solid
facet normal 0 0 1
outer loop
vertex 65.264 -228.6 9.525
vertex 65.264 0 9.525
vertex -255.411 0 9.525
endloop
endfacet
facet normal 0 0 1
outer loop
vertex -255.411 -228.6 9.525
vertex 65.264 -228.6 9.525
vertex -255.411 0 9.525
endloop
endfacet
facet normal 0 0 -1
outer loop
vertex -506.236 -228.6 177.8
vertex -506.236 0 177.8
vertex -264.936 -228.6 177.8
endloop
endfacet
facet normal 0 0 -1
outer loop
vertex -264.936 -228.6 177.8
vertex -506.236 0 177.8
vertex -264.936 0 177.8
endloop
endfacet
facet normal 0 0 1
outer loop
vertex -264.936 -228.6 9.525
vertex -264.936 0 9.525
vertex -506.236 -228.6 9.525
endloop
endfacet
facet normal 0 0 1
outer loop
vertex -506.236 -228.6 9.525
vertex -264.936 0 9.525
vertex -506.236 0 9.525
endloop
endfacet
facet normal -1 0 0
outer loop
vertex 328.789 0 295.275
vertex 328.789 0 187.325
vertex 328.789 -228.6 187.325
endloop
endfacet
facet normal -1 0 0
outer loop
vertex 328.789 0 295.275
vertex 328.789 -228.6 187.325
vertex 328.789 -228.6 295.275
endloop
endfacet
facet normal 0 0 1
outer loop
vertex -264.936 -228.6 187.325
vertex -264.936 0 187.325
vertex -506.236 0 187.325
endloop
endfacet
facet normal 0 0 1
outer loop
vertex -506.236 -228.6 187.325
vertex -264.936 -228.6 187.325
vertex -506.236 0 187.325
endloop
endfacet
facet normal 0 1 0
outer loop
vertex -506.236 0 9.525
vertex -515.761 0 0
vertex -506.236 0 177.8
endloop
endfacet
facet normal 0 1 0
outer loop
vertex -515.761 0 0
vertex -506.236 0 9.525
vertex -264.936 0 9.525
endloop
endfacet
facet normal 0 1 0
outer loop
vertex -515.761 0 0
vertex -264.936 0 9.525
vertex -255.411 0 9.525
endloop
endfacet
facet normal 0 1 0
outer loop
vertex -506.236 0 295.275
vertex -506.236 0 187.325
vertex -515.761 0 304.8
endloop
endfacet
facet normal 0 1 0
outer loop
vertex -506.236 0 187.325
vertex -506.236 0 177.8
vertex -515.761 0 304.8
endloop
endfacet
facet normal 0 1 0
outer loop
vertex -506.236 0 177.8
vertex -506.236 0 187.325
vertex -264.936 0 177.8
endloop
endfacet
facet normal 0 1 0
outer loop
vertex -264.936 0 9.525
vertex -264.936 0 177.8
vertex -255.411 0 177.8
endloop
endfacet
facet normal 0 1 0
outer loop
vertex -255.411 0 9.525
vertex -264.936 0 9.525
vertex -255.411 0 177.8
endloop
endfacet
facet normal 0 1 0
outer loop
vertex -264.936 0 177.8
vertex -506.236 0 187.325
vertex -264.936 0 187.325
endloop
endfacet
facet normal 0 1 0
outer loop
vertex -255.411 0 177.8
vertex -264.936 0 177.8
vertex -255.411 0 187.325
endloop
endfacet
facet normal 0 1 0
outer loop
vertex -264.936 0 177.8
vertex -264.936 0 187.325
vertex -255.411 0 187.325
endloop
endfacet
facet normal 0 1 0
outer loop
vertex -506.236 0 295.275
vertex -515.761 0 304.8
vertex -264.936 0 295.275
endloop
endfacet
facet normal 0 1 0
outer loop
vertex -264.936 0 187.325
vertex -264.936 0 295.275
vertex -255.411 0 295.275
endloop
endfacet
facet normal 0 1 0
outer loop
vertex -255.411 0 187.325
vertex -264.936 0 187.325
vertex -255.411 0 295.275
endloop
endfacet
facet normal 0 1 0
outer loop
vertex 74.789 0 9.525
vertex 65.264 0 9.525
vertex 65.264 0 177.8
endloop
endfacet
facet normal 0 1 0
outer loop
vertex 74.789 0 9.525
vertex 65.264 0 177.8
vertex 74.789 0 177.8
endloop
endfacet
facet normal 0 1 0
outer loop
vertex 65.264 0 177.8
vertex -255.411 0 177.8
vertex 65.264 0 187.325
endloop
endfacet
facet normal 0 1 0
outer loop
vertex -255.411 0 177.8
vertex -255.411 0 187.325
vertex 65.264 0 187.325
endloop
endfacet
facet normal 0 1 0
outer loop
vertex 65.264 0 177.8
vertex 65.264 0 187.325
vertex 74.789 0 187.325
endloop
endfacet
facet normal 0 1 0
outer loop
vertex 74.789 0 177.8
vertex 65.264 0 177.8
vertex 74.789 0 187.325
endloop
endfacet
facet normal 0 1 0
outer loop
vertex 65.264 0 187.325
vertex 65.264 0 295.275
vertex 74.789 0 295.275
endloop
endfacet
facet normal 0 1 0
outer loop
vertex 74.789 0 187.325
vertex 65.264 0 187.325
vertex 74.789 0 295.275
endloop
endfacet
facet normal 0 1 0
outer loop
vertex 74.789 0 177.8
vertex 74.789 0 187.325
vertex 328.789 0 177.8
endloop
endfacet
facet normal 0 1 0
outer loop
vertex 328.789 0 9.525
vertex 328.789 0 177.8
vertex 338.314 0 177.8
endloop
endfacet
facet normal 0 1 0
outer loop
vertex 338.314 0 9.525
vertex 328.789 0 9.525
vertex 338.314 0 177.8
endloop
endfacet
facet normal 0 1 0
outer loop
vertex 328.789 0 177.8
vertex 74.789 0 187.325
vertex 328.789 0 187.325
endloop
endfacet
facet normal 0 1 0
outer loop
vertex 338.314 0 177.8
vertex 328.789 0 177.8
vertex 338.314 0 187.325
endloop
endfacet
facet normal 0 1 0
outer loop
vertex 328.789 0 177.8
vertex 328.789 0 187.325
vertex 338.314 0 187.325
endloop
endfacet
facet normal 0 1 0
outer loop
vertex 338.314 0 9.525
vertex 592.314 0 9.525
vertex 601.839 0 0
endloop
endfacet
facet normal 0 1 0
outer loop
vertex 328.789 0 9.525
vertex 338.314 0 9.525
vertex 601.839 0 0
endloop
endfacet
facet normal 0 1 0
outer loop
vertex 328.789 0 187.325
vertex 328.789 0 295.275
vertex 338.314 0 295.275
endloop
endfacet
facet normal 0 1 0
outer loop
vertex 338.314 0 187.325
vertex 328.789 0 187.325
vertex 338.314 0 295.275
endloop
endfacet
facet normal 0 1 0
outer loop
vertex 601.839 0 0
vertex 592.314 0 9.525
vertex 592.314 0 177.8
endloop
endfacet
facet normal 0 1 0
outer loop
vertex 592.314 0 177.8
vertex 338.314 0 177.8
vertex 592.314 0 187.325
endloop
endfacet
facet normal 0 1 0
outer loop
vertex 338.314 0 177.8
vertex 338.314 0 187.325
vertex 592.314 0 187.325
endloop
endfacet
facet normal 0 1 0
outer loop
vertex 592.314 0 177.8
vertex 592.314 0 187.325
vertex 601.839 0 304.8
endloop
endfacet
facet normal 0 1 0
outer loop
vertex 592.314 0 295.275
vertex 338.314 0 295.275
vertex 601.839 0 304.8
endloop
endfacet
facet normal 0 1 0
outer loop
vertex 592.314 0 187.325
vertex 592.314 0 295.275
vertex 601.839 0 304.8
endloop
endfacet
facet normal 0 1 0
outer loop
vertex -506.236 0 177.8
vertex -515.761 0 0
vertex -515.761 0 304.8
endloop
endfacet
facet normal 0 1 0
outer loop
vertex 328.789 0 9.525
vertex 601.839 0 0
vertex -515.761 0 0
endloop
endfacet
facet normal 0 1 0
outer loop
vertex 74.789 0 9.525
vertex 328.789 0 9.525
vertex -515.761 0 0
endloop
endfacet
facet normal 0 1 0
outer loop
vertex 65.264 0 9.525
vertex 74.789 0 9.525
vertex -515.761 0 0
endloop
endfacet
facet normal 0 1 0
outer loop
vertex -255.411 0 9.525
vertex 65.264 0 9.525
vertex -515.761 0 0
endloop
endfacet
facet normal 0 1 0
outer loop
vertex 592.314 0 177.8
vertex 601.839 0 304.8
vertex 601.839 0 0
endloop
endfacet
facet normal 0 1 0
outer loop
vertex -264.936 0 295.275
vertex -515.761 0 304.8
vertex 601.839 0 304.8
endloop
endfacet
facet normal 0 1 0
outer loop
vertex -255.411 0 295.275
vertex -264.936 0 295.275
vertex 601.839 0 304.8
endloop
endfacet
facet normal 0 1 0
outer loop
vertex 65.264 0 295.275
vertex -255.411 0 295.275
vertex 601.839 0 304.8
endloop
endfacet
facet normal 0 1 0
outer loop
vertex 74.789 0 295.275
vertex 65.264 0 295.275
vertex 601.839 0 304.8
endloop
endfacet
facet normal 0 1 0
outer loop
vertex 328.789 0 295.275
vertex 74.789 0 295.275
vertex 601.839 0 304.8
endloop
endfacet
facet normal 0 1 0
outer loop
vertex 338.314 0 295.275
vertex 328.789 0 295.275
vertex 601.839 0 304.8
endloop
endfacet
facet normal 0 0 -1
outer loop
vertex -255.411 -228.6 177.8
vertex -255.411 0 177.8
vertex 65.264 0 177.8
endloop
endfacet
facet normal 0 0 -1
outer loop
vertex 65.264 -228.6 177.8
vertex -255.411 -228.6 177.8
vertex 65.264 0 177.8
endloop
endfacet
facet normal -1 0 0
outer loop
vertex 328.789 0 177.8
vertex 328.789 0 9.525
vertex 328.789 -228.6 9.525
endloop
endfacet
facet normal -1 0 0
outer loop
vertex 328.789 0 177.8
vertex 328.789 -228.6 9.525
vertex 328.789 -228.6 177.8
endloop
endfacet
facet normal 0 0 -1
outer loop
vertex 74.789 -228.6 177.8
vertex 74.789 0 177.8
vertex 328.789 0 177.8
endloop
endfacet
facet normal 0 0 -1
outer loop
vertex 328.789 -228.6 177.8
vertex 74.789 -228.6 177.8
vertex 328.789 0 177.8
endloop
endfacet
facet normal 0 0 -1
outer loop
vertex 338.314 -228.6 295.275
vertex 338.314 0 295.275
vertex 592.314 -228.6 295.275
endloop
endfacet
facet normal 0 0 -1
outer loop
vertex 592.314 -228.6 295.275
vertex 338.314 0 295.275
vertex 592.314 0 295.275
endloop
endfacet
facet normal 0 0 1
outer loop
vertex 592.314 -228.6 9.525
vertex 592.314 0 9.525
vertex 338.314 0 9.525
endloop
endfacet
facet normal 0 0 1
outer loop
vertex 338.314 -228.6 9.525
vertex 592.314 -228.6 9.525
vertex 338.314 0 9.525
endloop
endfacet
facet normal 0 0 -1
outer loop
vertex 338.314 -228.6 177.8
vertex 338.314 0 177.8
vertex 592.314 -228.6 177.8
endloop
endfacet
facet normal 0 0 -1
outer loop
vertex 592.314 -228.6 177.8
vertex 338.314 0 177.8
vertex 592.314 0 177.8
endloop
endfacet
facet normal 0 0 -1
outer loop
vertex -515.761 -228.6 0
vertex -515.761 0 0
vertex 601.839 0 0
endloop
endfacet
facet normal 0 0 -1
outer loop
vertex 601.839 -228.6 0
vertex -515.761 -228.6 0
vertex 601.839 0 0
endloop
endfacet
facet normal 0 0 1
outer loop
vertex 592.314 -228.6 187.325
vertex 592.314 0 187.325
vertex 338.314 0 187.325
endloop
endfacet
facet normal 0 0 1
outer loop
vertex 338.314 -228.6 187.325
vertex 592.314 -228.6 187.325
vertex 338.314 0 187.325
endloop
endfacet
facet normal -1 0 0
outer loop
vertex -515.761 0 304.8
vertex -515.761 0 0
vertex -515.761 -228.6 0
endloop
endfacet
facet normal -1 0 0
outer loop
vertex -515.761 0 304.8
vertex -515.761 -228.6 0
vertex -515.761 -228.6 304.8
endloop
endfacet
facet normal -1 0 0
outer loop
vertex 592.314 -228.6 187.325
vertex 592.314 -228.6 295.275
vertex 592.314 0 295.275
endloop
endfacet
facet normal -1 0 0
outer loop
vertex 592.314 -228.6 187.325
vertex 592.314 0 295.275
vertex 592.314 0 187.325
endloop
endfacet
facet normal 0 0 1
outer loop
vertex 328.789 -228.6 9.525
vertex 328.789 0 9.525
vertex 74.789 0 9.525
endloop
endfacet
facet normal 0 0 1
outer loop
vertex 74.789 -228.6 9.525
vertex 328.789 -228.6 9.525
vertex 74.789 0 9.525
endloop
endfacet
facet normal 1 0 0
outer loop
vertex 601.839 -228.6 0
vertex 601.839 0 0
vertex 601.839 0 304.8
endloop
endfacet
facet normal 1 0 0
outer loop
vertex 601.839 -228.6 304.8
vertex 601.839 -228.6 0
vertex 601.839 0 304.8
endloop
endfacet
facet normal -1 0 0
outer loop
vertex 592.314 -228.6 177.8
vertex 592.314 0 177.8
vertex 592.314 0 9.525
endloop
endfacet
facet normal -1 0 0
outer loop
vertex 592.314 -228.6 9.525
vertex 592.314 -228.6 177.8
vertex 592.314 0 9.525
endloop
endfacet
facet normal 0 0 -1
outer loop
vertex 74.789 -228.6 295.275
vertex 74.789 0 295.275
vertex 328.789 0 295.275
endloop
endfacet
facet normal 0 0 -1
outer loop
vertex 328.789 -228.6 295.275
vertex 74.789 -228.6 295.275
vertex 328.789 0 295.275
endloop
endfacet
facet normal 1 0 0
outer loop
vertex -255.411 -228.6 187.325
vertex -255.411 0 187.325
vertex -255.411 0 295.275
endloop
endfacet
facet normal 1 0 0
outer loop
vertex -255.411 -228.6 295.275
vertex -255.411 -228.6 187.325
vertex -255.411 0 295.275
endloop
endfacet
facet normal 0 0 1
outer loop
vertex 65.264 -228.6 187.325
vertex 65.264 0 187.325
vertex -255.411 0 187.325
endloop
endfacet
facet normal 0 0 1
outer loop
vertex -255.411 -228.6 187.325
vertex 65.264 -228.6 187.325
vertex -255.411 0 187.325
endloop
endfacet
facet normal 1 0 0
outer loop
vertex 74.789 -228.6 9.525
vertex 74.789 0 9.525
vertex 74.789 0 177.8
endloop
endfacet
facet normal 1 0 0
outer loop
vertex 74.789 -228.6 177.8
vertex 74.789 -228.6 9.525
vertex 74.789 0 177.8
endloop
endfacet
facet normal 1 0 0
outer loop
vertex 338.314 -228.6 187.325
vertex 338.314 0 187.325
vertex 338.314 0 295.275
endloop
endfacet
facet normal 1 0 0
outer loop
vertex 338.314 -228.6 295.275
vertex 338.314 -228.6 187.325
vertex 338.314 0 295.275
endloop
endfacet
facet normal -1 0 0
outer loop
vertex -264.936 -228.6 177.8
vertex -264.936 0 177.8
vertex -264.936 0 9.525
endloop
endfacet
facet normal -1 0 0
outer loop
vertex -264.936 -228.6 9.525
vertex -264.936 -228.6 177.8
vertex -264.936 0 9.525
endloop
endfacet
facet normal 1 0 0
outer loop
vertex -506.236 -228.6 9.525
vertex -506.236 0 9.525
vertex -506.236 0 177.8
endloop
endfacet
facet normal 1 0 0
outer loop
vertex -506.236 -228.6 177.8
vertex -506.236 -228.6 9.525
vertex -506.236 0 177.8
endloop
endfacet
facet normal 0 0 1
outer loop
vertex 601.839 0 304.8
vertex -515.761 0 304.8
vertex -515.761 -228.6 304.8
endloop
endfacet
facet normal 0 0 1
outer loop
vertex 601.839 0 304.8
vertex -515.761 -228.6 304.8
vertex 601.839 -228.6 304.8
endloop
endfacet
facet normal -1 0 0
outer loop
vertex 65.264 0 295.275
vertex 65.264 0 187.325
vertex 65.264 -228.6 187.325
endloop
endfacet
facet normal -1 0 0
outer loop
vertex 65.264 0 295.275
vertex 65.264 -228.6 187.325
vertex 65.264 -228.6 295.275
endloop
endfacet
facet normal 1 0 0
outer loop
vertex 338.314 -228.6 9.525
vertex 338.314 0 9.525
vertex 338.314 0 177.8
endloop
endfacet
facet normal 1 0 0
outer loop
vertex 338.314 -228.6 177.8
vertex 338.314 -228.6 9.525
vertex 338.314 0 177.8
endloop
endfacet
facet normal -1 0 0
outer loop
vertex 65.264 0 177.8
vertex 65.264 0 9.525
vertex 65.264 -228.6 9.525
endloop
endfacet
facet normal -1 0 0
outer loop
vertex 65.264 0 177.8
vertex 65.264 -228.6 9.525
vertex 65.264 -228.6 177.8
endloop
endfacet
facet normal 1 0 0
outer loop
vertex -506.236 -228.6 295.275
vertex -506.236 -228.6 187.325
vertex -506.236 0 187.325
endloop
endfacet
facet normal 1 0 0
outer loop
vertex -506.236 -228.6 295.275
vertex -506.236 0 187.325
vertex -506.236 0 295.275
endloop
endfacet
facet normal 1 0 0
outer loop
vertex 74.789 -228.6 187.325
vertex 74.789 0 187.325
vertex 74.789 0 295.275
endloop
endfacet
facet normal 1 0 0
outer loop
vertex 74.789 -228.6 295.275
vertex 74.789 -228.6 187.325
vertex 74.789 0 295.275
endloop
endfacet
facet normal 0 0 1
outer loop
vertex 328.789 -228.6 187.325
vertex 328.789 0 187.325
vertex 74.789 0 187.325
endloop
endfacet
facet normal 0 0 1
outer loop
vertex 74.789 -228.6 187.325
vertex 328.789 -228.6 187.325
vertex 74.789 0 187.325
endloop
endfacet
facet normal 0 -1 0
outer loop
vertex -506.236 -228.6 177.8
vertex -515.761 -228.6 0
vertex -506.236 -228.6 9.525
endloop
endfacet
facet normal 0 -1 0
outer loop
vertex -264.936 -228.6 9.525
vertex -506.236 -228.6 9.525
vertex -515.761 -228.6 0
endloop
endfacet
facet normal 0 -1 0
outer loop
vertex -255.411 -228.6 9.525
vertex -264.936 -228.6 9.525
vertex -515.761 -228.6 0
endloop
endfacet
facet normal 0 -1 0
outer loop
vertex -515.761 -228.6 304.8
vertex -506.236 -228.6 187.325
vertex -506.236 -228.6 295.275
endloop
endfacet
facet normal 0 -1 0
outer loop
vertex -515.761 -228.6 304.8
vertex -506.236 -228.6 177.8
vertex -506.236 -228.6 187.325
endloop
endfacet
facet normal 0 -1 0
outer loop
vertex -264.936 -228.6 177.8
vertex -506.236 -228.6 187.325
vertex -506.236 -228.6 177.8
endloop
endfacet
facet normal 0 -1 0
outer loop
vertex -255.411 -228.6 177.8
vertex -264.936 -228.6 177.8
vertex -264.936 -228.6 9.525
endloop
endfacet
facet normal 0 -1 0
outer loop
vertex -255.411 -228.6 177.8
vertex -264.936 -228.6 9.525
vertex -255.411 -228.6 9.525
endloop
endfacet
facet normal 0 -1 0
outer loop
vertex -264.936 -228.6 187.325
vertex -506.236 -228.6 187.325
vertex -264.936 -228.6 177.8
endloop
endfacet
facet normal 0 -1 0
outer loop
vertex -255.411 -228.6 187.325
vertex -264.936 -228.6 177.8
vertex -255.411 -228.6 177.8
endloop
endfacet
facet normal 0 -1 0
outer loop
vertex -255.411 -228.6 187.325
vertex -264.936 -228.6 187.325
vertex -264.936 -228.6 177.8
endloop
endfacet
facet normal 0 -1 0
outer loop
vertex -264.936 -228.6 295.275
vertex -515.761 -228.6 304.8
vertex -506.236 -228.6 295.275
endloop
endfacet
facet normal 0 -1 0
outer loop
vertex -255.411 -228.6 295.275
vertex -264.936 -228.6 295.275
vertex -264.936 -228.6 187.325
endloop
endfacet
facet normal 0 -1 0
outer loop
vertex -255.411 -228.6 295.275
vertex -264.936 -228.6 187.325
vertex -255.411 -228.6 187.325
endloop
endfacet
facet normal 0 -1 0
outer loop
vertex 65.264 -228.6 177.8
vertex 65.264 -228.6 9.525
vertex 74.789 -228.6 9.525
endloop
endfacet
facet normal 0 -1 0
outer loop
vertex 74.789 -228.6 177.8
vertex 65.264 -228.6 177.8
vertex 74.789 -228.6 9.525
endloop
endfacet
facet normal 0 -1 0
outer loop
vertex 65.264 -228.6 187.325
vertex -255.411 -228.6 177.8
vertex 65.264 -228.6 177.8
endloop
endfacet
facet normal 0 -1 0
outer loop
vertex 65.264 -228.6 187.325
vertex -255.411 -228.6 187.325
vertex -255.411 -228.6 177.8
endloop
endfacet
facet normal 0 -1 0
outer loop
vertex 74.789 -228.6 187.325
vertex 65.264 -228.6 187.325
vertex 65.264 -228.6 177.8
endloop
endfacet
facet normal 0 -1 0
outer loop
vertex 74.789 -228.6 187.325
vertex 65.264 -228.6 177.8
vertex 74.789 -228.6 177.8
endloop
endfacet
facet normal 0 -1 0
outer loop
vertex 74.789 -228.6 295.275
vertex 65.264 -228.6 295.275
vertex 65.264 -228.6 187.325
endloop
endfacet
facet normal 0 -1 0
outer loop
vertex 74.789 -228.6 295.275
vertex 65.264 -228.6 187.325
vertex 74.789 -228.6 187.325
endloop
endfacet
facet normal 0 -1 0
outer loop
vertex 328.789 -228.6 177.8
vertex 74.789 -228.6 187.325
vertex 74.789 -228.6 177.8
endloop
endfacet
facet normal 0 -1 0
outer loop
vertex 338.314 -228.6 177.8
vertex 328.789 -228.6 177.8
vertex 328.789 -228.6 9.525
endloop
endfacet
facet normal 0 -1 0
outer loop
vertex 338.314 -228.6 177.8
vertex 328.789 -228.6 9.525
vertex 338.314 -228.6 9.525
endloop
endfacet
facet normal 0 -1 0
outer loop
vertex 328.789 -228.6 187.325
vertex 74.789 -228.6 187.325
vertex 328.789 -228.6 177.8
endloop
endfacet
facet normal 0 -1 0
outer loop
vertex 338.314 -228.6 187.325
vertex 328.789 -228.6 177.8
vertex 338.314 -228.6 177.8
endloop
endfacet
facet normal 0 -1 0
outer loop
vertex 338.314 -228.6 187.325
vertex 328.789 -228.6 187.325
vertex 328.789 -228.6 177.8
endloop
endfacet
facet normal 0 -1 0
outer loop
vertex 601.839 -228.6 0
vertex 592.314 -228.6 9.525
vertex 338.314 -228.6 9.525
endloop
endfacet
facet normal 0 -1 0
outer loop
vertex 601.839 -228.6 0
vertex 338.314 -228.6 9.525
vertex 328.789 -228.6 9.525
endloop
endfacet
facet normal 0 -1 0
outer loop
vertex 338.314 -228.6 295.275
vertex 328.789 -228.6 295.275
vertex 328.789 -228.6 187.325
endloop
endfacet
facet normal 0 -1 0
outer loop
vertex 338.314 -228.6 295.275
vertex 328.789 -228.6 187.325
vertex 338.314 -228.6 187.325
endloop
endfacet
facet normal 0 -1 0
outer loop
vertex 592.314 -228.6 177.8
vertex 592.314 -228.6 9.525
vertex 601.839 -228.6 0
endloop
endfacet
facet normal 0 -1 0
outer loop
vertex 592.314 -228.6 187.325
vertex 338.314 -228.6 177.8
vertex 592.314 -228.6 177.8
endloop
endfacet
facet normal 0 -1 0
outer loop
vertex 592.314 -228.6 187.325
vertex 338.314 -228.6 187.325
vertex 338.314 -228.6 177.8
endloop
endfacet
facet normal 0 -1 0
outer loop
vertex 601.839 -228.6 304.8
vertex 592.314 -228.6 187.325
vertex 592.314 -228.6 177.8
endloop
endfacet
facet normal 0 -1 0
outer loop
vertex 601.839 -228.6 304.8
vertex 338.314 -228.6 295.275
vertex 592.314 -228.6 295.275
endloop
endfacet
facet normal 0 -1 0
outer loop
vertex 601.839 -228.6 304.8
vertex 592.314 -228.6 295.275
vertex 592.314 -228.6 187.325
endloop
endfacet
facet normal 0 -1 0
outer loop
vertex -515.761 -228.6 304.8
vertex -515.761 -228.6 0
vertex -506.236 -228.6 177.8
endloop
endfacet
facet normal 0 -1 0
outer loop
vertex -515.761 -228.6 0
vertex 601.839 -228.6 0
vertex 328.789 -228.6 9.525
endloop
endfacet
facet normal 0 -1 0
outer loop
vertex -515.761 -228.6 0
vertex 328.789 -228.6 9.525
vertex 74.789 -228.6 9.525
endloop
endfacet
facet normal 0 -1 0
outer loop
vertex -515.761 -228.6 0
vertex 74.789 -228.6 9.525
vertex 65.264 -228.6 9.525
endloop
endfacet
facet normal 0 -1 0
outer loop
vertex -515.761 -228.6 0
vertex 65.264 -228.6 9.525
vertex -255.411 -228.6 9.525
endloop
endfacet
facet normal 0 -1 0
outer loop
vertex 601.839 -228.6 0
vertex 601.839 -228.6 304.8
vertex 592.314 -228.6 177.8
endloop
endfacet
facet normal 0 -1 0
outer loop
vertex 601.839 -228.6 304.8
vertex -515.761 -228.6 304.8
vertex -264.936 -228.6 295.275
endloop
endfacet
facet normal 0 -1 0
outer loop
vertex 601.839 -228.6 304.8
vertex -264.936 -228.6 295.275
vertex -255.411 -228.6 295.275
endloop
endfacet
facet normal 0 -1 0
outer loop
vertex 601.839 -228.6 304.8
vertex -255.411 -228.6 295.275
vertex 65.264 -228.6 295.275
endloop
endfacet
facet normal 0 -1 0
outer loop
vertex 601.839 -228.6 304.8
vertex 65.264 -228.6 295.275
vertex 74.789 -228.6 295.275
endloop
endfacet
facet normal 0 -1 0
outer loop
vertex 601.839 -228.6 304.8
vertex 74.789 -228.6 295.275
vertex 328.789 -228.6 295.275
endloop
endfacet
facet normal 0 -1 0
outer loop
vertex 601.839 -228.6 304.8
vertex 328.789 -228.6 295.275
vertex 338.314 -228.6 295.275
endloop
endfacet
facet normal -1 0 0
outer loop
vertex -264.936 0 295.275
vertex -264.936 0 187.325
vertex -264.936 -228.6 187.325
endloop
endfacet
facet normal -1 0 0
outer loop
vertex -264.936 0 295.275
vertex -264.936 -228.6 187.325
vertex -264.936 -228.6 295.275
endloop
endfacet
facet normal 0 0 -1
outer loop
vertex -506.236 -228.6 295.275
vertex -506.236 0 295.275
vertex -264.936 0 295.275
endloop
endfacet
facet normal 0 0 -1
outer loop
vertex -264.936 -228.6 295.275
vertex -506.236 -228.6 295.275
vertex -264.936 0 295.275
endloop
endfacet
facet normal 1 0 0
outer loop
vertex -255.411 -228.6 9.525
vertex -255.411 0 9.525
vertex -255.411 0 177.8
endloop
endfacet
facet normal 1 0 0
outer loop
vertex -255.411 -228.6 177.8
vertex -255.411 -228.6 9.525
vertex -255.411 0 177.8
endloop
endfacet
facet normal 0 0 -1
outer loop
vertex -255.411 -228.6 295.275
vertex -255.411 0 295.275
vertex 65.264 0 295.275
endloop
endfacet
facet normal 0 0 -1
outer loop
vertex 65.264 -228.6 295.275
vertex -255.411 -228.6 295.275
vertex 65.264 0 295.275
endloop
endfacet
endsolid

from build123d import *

# Parameters (mm, degrees)
F0_W     = 1117.6
F0_H     = 304.8
F0_W_2   = 9.525
F0_H_2   = 107.95
F1_DEPTH = 228.6
F0_W_3   = 320.675
F0_H_3   = 9.525
F0_W_4   = 254
F2_DEPTH = 228.6
F0_H_4   = 168.275
F3_DEPTH = 228.6
F4_DEPTH = 228.6
F5_DEPTH = 228.6


with BuildPart() as f1:
    # F0 (on Front) → F1 (new body)
    with BuildSketch(Plane.XZ):
        with Locations((43.0389853762, 152.4)):
            Rectangle(F0_W, F0_H)
        Polygon((-264.9360146238, 9.525), (-506.2360146238, 9.525), (-506.2360146238, 177.8), (-506.2360146238, 187.325), (-506.2360146238, 295.275), (-264.9360146238, 295.275), (-255.4110146238, 295.275), (65.2639853762, 295.275), (74.7889853762, 295.275), (328.7889853762, 295.275), (338.3139853762, 295.275), (592.3139853762, 295.275), (592.3139853762, 187.325), (592.3139853762, 177.8), (592.3139853762, 9.525), (338.3139853762, 9.525), (328.7889853762, 9.525), (74.7889853762, 9.525), (65.2639853762, 9.525), (-255.4110146238, 9.525), align=None, mode=Mode.SUBTRACT)
        Polygon((-506.2360146238, 187.325), (-506.2360146238, 177.8), (-264.9360146238, 177.8), (-264.9360146238, 9.525), (-255.4110146238, 9.525), (-255.4110146238, 177.8), (-255.4110146238, 187.325), (-264.9360146238, 187.325), align=None)
        with Locations((-260.1735146238, 241.3)):
            Rectangle(F0_W_2, F0_H_2)
    extrude(amount=F1_DEPTH)

    # F0 (on Front) → F2 (join, through all)
    with BuildSketch(Plane.XZ):
        with Locations((-95.0735146238, 182.5625)):
            Rectangle(F0_W_3, F0_H_3)
        with Locations((70.0264853762, 182.5625)):
            Rectangle(F0_W_2, F0_H_3)
        with Locations((201.7889853762, 182.5625)):
            Rectangle(F0_W_4, F0_H_3)
        with Locations((333.5514853762, 182.5625)):
            Rectangle(F0_W_2, F0_H_3)
        with Locations((465.3139853762, 182.5625)):
            Rectangle(F0_W_4, F0_H_3)
    extrude(amount=F2_DEPTH)

    # F0 (on Front) → F3 (join, through all)
    with BuildSketch(Plane.XZ):
        with Locations((333.5514853762, 93.6625)):
            Rectangle(F0_W_2, F0_H_4)
    extrude(amount=F3_DEPTH)

    # F0 (on Front) → F4 (join, through all)
    with BuildSketch(Plane.XZ):
        with Locations((-95.0735146238, 182.5625)):
            Rectangle(F0_W_3, F0_H_3)
        with Locations((70.0264853762, 93.6625)):
            Rectangle(F0_W_2, F0_H_4)
    extrude(amount=F4_DEPTH)

    # F0 (on Front) → F5 (join, through all)
    with BuildSketch(Plane.XZ):
        with Locations((70.0264853762, 241.3)):
            Rectangle(F0_W_2, F0_H_2)
        with Locations((333.5514853762, 241.3)):
            Rectangle(F0_W_2, F0_H_2)
    extrude(amount=F5_DEPTH)


solid = f1.part
